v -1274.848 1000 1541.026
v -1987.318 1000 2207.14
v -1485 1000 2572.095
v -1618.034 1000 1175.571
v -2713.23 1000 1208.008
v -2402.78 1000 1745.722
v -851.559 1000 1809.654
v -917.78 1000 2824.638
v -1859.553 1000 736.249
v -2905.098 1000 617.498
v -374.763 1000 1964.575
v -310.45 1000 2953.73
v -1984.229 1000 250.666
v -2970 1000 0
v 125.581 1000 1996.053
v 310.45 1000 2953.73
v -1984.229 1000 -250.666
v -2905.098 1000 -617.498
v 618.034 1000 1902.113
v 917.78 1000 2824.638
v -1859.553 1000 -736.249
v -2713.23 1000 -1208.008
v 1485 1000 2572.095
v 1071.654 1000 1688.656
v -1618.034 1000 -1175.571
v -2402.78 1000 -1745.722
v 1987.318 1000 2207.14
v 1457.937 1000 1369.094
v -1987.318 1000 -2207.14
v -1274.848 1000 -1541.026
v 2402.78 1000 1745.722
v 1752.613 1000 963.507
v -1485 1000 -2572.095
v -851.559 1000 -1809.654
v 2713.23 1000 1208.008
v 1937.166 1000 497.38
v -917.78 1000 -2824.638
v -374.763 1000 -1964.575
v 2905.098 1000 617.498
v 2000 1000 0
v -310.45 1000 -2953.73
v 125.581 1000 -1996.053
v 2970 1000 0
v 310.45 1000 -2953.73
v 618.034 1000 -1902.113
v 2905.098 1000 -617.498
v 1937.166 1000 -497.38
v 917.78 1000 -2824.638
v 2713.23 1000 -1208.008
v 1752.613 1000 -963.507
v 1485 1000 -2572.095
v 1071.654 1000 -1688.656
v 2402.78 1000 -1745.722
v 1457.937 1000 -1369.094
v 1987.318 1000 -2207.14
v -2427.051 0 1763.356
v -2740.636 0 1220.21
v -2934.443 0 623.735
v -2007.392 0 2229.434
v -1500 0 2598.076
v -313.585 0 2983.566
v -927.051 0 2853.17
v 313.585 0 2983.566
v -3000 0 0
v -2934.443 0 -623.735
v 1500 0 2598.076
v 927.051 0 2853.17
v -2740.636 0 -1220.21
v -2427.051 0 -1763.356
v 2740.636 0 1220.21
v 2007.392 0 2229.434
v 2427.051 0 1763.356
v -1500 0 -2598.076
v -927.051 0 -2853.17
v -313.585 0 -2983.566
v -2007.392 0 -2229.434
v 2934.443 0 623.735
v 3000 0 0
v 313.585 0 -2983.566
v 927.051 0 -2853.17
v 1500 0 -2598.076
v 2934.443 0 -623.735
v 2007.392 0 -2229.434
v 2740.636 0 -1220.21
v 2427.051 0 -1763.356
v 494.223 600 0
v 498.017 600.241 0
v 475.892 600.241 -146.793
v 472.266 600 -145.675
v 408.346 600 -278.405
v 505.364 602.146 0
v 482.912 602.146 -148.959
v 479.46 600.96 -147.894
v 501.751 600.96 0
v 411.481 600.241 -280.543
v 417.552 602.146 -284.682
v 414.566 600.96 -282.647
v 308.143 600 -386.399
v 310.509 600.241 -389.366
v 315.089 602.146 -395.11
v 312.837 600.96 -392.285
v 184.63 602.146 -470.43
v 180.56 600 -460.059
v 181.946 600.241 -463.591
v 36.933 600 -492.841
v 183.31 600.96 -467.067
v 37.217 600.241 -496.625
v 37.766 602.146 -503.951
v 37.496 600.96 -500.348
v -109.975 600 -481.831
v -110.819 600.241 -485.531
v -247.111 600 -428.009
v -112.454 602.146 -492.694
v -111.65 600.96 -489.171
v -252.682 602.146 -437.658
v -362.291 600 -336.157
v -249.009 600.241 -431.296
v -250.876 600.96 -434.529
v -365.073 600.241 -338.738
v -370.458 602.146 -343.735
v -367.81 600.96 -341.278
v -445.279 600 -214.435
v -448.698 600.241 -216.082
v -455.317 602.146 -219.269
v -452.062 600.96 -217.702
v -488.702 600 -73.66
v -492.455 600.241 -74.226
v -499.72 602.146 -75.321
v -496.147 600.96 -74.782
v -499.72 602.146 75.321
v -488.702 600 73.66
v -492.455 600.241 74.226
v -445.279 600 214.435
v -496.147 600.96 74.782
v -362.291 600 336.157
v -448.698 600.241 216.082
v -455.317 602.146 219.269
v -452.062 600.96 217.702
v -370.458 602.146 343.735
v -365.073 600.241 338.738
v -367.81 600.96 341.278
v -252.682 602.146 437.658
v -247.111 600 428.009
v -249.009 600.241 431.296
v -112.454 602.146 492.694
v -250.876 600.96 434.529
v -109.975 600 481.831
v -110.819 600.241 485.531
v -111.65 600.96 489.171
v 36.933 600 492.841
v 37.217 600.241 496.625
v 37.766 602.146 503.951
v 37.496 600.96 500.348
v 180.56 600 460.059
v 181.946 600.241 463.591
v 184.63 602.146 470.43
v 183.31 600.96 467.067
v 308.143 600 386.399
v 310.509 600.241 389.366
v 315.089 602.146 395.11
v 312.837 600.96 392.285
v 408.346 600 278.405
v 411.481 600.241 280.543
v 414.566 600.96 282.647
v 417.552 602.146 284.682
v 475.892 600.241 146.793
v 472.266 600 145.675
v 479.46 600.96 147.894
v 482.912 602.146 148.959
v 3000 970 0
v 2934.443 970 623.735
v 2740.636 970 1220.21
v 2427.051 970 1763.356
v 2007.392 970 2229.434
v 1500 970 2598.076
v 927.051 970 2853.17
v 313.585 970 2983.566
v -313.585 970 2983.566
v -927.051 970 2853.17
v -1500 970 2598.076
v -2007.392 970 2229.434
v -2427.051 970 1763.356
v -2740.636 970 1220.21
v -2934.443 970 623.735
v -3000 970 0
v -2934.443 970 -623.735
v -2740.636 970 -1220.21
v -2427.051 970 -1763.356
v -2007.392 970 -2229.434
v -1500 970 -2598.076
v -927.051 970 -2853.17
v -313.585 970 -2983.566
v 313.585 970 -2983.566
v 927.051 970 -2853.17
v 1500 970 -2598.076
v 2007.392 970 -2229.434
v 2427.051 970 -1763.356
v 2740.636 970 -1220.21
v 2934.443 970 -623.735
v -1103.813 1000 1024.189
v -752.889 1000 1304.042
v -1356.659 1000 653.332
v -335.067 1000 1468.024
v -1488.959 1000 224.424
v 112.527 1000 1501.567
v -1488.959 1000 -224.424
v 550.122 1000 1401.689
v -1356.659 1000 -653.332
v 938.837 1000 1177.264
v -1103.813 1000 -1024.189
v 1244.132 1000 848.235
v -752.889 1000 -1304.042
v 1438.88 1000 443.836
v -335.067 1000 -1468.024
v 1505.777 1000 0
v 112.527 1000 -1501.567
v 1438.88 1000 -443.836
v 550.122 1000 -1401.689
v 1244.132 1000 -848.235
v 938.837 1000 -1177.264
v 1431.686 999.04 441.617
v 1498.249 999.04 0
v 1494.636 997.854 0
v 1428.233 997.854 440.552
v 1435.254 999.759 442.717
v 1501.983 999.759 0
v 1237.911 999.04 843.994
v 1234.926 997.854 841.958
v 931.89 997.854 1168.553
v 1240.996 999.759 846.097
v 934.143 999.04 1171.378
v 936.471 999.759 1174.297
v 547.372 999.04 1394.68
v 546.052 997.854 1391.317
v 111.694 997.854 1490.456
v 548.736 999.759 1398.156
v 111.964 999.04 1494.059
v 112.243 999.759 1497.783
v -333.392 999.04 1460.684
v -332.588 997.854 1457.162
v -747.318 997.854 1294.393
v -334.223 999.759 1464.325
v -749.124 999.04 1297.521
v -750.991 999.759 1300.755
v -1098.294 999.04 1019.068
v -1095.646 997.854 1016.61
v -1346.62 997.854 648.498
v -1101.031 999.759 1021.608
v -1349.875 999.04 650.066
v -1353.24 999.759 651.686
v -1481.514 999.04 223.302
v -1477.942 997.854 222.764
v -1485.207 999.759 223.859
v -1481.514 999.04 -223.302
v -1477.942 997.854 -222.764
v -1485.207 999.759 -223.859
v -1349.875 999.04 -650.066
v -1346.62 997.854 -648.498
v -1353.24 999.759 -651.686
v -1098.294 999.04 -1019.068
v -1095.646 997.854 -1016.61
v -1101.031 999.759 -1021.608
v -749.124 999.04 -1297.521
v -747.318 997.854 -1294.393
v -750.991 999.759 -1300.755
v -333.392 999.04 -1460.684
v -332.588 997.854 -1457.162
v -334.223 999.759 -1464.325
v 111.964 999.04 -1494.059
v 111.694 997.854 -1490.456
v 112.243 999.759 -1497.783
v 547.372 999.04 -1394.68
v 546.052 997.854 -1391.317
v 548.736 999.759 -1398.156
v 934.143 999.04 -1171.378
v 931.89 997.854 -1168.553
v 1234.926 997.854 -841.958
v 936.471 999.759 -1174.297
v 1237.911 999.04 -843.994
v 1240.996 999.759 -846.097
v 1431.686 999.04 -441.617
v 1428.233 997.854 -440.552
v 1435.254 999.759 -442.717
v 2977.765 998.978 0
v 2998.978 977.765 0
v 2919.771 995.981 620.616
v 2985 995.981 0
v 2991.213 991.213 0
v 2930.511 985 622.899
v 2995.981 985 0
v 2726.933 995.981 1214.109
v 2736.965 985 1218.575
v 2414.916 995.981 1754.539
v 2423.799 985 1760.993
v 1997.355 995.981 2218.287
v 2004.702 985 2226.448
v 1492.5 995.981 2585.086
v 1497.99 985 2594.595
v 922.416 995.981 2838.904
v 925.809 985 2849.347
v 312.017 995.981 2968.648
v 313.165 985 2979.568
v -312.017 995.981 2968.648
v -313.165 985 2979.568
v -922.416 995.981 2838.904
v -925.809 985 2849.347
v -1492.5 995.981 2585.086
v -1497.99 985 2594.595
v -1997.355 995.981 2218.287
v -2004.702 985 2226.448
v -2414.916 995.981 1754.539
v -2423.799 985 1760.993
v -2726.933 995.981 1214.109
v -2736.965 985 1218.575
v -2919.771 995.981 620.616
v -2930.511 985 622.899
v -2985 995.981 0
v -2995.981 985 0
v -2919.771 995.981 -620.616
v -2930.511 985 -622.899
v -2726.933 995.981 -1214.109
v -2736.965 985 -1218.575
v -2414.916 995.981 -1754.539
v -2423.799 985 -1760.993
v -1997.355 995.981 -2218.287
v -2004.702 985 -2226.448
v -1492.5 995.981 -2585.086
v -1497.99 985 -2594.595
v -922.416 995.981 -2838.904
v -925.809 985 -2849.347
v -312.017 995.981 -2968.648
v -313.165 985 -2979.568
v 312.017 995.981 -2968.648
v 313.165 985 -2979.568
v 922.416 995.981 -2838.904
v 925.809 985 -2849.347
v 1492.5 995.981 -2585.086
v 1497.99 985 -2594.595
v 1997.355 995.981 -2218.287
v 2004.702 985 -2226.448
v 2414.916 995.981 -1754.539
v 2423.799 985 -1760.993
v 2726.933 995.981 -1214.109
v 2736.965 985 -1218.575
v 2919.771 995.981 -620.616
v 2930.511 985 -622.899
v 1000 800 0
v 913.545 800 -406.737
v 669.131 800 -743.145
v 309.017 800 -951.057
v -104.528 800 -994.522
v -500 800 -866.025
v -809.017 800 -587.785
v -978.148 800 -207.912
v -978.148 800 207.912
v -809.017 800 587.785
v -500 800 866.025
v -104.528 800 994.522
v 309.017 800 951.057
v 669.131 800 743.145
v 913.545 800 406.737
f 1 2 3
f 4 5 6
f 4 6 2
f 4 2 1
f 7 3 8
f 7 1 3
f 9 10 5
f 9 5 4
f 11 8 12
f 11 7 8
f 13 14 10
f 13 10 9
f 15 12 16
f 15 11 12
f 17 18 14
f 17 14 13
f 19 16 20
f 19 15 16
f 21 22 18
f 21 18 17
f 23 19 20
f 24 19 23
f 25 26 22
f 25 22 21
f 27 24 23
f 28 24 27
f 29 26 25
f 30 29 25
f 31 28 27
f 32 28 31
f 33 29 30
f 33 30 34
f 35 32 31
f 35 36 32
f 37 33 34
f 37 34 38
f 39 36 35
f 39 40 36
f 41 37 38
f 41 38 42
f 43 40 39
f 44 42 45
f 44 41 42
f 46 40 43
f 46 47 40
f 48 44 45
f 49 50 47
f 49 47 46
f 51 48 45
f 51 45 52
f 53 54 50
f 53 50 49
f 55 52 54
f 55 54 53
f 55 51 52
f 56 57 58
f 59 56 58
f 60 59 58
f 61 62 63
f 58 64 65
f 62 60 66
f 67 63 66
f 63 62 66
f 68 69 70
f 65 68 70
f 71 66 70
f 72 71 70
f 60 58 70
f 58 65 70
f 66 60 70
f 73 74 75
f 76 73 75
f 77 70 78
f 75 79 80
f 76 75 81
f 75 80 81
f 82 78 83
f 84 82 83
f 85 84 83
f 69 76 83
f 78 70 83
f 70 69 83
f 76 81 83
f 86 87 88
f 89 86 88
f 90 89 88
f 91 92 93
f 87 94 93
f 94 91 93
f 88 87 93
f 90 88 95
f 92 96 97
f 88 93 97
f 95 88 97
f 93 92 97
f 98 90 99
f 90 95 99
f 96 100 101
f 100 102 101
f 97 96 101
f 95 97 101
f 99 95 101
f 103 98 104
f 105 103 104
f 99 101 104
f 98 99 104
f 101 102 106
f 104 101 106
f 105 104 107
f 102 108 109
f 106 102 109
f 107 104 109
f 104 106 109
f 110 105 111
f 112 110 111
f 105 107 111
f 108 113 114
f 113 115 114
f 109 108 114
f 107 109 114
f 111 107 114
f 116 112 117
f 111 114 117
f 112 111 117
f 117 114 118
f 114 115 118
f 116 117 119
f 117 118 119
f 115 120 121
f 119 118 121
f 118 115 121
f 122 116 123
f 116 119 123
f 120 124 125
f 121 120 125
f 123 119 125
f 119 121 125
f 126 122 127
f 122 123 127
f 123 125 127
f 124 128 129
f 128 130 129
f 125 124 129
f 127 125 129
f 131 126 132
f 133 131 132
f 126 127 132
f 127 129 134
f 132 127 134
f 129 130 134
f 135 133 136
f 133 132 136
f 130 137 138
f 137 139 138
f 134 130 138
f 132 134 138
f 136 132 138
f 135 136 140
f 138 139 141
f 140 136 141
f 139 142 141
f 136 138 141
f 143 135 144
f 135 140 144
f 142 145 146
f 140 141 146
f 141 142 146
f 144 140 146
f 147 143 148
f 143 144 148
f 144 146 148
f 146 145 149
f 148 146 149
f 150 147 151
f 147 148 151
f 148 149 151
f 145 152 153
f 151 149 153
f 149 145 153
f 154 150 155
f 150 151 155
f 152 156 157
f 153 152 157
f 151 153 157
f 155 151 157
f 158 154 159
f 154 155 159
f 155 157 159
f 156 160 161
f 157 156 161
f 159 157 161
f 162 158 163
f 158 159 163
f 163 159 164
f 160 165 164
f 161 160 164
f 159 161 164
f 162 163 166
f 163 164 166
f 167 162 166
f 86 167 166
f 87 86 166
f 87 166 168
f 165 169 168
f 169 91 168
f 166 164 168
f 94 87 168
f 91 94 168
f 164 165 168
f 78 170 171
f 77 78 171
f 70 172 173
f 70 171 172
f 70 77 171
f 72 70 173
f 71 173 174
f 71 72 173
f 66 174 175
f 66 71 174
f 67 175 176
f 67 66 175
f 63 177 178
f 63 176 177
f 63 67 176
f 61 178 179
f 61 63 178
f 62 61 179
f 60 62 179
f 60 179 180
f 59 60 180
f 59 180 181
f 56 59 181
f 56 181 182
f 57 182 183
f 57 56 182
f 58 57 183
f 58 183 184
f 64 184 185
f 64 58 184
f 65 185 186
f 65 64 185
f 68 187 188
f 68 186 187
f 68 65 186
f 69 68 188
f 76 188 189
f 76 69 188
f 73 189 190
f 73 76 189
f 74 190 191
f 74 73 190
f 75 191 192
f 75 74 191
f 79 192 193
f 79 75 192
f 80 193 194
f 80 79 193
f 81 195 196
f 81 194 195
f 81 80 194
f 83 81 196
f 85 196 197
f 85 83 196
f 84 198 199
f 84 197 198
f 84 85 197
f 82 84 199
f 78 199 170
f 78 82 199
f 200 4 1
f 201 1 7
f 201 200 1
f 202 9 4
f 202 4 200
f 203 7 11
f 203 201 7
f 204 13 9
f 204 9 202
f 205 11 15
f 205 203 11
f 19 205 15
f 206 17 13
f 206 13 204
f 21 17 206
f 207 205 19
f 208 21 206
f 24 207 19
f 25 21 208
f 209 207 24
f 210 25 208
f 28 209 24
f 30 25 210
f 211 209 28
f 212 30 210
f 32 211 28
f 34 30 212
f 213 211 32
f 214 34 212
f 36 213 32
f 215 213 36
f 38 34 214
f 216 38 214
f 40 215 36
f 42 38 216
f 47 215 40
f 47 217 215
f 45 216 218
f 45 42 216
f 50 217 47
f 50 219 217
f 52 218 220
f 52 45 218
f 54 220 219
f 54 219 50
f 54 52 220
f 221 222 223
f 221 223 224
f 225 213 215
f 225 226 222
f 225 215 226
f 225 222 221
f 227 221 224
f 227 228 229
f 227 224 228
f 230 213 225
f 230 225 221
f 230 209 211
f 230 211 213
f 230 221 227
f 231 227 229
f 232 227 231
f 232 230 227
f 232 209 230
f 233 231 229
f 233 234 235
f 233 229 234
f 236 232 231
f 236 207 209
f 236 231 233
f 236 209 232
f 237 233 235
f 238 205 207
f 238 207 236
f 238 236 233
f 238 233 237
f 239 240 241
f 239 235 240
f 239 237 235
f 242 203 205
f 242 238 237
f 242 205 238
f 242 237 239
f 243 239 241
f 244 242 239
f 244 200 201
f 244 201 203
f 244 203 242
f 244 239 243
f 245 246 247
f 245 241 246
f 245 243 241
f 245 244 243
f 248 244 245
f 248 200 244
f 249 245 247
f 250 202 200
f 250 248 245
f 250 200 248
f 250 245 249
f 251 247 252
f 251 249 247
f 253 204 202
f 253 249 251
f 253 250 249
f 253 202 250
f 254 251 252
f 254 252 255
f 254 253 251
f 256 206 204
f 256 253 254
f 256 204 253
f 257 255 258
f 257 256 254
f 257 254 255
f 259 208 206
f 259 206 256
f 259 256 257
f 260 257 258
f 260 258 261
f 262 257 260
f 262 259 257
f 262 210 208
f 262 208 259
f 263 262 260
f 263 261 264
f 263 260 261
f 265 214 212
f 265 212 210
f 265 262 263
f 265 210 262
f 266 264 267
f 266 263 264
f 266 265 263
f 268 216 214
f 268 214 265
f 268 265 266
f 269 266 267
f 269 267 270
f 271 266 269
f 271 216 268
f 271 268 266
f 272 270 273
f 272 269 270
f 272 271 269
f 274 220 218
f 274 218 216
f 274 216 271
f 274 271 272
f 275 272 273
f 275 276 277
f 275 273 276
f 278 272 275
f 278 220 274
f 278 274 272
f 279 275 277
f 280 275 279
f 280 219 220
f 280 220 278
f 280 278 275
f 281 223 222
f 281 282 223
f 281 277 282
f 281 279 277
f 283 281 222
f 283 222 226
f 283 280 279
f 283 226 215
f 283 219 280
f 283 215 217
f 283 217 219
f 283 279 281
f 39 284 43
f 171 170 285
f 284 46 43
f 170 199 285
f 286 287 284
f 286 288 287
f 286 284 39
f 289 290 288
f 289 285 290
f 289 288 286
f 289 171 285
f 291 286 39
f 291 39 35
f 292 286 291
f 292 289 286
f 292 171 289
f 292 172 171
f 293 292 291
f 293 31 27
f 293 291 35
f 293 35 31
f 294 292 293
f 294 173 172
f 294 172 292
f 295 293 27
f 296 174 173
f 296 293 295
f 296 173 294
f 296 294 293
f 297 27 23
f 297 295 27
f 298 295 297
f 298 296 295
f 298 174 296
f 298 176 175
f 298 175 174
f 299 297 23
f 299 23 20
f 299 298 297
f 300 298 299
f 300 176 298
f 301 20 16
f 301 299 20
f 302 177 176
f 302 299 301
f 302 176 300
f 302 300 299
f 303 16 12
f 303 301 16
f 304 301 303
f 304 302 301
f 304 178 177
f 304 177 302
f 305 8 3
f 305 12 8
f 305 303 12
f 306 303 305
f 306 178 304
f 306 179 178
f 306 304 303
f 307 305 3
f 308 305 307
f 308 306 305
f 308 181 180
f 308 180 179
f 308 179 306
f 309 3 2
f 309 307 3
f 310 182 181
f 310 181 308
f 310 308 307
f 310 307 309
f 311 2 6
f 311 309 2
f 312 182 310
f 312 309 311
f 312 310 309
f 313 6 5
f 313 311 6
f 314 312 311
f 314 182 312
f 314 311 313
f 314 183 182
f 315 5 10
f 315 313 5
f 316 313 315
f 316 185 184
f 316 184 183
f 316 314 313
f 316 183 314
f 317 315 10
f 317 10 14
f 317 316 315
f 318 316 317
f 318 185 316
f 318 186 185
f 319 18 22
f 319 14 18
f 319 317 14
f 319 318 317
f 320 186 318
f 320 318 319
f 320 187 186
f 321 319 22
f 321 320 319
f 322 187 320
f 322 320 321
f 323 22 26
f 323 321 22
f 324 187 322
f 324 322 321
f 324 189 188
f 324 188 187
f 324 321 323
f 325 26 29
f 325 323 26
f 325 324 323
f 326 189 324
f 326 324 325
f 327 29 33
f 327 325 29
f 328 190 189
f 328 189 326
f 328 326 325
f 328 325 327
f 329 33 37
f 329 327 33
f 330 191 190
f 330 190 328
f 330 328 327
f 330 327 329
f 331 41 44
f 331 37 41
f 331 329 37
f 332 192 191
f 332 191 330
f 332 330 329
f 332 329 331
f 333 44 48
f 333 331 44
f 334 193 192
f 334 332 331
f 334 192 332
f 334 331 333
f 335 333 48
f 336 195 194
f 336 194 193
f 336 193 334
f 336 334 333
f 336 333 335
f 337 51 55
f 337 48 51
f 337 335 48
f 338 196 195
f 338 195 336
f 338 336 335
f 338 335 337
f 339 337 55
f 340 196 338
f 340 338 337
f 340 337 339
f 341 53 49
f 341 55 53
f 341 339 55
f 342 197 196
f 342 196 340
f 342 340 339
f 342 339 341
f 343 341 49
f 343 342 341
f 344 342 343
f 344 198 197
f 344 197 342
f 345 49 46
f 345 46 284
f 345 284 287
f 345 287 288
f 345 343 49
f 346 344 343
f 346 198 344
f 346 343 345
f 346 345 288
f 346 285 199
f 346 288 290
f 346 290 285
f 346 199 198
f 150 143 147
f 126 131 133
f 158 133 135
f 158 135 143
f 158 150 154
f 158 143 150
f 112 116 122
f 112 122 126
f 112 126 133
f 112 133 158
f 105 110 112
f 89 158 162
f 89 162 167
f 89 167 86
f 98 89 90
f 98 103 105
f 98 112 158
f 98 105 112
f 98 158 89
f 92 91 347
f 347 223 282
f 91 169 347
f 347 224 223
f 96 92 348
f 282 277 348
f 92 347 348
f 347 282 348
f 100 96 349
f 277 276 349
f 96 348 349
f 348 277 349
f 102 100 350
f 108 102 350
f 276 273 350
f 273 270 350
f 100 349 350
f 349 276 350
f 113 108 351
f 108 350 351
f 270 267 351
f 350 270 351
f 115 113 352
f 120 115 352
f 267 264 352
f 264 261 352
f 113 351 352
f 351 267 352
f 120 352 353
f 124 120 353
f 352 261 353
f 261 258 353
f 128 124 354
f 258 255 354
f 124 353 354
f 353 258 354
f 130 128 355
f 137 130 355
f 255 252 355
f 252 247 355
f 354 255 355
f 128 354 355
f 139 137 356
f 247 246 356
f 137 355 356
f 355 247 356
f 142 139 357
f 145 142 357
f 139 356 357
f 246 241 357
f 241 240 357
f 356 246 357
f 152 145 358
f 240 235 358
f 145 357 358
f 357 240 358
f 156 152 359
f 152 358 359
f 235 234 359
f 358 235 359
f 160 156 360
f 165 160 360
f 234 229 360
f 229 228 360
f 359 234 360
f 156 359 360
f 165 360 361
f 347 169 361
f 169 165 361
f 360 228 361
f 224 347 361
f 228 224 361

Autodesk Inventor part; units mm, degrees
ref_plane "YZ Plane" through (0, 0, 0) normal (1, 0, 0) x (0, 1, 0)
ref_plane "XZ Plane" through (0, 0, 0) normal (0, 1, 0) x (-1, 0, 0)
ref_plane "XY Plane" through (0, 0, 0) normal (0, 0, 1) x (1, 0, 0)
sketch "Boceto1" plane through (0, 0, 0) normal (0, 0, 1) x (1, 0, 0)
  line L0 (0, 0) -> (0, 1000)
  line L1 (3000, 1000) -> (3000, 0)
  line L2 (3000, 0) -> (0, 0)
  line L3 (3000, 1000) -> (2000, 1000)
  line L4 (0, 600) -> (500, 600)
  line L5 (2000, 1000) -> (1500, 1000)
  line L6 (1500, 1000) -> (500, 600)
  dimension "d0" = 1000
  dimension "d1" = 3000
  dimension "d2" = 1000
  dimension "d4" = 500
  dimension "d5" = 500
revolve "Revolución1" add sketch "Boceto1" angle 360 about axis through (0, 0, 0) along (0, 1, 0)
fillet "Empalme1" radius 30 1 edges at (-500, 600, 0)
fillet "Empalme2" radius 30 1 edges at (-1500, 1000, 0)
fillet "Empalme3" radius 30 1 edges at (-3000, 1000, 0)
properties part number "PARTE_SUPERIOR_BALSA_FLOTABILIDAD_UNIDMOTRIZVALPO"
